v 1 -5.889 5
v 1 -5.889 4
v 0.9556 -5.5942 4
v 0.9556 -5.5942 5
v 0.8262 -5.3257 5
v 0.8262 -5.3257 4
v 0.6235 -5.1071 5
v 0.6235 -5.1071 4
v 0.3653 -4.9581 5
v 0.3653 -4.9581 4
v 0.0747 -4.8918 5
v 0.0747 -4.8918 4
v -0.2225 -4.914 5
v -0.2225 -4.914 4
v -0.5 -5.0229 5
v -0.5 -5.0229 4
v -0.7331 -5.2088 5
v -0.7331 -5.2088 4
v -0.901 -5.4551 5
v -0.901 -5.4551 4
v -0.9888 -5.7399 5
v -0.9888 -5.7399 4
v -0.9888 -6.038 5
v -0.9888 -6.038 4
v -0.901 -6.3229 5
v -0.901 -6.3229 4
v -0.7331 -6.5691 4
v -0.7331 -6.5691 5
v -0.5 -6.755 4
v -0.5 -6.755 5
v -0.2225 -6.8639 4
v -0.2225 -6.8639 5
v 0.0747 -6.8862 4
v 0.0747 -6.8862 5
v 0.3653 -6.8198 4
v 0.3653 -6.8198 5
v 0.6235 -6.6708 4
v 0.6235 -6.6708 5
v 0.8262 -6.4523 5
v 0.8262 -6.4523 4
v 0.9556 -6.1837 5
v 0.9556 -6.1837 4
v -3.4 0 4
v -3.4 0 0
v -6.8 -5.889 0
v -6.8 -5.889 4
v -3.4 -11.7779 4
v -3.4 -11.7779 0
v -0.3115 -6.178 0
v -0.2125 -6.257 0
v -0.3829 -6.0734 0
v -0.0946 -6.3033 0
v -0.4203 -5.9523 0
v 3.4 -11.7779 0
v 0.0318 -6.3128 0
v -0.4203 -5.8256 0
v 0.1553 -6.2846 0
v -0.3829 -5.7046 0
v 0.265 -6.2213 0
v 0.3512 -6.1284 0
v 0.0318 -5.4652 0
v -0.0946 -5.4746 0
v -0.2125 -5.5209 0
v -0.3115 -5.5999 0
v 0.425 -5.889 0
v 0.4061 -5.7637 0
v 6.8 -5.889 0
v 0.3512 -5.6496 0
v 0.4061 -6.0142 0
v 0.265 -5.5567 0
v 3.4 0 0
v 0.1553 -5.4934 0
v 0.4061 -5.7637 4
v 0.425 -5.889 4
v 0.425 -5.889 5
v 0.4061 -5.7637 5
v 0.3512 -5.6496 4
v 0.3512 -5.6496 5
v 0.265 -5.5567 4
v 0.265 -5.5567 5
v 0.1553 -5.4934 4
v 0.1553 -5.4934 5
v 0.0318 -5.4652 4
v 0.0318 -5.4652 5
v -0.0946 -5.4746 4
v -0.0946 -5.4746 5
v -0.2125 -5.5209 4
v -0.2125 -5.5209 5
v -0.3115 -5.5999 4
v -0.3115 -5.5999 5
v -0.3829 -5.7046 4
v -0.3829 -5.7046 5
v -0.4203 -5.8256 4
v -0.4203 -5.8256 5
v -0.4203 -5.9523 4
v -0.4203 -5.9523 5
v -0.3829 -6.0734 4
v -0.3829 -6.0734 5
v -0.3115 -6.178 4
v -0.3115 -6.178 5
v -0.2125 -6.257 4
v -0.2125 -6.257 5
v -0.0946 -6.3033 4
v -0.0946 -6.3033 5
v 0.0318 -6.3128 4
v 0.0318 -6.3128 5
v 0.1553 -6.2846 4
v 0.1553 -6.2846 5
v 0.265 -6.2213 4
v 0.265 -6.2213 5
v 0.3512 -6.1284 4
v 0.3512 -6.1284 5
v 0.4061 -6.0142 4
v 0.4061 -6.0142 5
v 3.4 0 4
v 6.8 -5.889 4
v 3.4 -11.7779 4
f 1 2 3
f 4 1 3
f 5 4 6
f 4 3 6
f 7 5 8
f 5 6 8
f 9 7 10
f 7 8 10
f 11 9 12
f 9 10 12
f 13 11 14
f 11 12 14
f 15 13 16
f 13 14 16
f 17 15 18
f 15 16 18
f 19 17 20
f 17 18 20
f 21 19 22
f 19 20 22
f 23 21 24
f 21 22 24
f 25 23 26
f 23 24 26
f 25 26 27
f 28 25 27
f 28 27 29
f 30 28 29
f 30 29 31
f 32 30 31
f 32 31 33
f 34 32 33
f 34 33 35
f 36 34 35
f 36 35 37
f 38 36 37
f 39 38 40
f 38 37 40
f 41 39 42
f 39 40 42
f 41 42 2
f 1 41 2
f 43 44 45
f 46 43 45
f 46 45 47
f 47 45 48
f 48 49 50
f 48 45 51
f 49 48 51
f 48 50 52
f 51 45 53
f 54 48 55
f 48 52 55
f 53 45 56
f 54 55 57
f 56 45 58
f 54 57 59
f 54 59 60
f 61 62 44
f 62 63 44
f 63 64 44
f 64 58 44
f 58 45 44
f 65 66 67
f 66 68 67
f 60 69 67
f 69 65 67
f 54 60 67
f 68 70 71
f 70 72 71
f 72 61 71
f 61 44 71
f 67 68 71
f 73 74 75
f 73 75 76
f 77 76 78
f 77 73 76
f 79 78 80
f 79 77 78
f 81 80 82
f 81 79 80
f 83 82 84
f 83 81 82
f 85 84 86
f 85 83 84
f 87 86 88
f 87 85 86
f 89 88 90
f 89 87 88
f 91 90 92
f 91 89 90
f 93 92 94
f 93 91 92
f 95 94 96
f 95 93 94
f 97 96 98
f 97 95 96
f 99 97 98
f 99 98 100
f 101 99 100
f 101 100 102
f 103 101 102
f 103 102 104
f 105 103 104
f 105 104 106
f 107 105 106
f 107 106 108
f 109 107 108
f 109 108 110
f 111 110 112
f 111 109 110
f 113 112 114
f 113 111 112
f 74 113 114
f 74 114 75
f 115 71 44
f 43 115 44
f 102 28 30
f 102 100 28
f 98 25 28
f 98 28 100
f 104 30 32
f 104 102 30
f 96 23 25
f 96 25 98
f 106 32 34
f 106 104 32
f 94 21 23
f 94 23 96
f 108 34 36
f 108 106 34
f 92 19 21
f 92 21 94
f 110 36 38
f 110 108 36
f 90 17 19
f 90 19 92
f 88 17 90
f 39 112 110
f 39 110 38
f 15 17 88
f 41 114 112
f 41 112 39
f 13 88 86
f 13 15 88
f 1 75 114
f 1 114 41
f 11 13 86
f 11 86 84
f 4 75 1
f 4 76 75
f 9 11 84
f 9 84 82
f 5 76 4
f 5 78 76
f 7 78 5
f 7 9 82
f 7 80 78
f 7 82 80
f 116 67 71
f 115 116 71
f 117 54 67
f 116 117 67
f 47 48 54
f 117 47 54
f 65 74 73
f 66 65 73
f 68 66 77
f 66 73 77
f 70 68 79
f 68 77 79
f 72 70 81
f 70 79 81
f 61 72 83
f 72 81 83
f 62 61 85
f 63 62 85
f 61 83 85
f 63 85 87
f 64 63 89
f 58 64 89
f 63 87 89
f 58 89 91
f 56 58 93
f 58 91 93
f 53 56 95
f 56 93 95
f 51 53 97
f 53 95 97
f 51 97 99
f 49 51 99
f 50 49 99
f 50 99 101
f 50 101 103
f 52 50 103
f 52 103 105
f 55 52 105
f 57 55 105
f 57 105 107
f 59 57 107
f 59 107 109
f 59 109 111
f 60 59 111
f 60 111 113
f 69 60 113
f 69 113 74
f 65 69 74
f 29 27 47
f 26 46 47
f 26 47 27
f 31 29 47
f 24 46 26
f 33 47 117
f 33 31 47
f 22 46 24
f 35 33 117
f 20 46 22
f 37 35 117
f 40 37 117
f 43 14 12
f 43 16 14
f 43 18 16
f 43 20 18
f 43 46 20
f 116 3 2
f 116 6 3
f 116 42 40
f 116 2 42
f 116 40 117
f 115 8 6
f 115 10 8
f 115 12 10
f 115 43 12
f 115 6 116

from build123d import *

# Parameters (mm, degrees)
BOSS_EXTRUDE1_DEPTH = 4
SKETCH2_R           = 1
SKETCH2_R_2         = 0.425
BOSS_EXTRUDE2_DEPTH = 1
SKETCH6_R           = 0.425
CUT_EXTRUDE1_DEPTH  = 63


with BuildPart() as part:
    # Sketch1 → Boss-Extrude1 (new body)
    with BuildSketch(Plane.XY):
        Polygon((3.4, 0), (-3.4, 0), (-6.8, -5.888972746), (-3.4, -11.777945491), (3.4, -11.777945491), (6.8, -5.888972746), align=None)
    extrude(amount=BOSS_EXTRUDE1_DEPTH)

    # Sketch2 → Boss-Extrude2 (add)
    with BuildSketch(Plane.XY.offset(4)):
        with Locations((0, -5.888972746)):
            Circle(SKETCH2_R)
        with Locations((0, -5.888972746)):
            Circle(SKETCH2_R_2, mode=Mode.SUBTRACT)
    extrude(amount=BOSS_EXTRUDE2_DEPTH)

    # Sketch6 → Cut-Extrude1 (cut)
    with BuildSketch(Plane.XY.offset(4)):
        with Locations((0, -5.888972746)):
            Circle(SKETCH6_R)
    extrude(amount=-CUT_EXTRUDE1_DEPTH, mode=Mode.SUBTRACT)


solid = part.part
